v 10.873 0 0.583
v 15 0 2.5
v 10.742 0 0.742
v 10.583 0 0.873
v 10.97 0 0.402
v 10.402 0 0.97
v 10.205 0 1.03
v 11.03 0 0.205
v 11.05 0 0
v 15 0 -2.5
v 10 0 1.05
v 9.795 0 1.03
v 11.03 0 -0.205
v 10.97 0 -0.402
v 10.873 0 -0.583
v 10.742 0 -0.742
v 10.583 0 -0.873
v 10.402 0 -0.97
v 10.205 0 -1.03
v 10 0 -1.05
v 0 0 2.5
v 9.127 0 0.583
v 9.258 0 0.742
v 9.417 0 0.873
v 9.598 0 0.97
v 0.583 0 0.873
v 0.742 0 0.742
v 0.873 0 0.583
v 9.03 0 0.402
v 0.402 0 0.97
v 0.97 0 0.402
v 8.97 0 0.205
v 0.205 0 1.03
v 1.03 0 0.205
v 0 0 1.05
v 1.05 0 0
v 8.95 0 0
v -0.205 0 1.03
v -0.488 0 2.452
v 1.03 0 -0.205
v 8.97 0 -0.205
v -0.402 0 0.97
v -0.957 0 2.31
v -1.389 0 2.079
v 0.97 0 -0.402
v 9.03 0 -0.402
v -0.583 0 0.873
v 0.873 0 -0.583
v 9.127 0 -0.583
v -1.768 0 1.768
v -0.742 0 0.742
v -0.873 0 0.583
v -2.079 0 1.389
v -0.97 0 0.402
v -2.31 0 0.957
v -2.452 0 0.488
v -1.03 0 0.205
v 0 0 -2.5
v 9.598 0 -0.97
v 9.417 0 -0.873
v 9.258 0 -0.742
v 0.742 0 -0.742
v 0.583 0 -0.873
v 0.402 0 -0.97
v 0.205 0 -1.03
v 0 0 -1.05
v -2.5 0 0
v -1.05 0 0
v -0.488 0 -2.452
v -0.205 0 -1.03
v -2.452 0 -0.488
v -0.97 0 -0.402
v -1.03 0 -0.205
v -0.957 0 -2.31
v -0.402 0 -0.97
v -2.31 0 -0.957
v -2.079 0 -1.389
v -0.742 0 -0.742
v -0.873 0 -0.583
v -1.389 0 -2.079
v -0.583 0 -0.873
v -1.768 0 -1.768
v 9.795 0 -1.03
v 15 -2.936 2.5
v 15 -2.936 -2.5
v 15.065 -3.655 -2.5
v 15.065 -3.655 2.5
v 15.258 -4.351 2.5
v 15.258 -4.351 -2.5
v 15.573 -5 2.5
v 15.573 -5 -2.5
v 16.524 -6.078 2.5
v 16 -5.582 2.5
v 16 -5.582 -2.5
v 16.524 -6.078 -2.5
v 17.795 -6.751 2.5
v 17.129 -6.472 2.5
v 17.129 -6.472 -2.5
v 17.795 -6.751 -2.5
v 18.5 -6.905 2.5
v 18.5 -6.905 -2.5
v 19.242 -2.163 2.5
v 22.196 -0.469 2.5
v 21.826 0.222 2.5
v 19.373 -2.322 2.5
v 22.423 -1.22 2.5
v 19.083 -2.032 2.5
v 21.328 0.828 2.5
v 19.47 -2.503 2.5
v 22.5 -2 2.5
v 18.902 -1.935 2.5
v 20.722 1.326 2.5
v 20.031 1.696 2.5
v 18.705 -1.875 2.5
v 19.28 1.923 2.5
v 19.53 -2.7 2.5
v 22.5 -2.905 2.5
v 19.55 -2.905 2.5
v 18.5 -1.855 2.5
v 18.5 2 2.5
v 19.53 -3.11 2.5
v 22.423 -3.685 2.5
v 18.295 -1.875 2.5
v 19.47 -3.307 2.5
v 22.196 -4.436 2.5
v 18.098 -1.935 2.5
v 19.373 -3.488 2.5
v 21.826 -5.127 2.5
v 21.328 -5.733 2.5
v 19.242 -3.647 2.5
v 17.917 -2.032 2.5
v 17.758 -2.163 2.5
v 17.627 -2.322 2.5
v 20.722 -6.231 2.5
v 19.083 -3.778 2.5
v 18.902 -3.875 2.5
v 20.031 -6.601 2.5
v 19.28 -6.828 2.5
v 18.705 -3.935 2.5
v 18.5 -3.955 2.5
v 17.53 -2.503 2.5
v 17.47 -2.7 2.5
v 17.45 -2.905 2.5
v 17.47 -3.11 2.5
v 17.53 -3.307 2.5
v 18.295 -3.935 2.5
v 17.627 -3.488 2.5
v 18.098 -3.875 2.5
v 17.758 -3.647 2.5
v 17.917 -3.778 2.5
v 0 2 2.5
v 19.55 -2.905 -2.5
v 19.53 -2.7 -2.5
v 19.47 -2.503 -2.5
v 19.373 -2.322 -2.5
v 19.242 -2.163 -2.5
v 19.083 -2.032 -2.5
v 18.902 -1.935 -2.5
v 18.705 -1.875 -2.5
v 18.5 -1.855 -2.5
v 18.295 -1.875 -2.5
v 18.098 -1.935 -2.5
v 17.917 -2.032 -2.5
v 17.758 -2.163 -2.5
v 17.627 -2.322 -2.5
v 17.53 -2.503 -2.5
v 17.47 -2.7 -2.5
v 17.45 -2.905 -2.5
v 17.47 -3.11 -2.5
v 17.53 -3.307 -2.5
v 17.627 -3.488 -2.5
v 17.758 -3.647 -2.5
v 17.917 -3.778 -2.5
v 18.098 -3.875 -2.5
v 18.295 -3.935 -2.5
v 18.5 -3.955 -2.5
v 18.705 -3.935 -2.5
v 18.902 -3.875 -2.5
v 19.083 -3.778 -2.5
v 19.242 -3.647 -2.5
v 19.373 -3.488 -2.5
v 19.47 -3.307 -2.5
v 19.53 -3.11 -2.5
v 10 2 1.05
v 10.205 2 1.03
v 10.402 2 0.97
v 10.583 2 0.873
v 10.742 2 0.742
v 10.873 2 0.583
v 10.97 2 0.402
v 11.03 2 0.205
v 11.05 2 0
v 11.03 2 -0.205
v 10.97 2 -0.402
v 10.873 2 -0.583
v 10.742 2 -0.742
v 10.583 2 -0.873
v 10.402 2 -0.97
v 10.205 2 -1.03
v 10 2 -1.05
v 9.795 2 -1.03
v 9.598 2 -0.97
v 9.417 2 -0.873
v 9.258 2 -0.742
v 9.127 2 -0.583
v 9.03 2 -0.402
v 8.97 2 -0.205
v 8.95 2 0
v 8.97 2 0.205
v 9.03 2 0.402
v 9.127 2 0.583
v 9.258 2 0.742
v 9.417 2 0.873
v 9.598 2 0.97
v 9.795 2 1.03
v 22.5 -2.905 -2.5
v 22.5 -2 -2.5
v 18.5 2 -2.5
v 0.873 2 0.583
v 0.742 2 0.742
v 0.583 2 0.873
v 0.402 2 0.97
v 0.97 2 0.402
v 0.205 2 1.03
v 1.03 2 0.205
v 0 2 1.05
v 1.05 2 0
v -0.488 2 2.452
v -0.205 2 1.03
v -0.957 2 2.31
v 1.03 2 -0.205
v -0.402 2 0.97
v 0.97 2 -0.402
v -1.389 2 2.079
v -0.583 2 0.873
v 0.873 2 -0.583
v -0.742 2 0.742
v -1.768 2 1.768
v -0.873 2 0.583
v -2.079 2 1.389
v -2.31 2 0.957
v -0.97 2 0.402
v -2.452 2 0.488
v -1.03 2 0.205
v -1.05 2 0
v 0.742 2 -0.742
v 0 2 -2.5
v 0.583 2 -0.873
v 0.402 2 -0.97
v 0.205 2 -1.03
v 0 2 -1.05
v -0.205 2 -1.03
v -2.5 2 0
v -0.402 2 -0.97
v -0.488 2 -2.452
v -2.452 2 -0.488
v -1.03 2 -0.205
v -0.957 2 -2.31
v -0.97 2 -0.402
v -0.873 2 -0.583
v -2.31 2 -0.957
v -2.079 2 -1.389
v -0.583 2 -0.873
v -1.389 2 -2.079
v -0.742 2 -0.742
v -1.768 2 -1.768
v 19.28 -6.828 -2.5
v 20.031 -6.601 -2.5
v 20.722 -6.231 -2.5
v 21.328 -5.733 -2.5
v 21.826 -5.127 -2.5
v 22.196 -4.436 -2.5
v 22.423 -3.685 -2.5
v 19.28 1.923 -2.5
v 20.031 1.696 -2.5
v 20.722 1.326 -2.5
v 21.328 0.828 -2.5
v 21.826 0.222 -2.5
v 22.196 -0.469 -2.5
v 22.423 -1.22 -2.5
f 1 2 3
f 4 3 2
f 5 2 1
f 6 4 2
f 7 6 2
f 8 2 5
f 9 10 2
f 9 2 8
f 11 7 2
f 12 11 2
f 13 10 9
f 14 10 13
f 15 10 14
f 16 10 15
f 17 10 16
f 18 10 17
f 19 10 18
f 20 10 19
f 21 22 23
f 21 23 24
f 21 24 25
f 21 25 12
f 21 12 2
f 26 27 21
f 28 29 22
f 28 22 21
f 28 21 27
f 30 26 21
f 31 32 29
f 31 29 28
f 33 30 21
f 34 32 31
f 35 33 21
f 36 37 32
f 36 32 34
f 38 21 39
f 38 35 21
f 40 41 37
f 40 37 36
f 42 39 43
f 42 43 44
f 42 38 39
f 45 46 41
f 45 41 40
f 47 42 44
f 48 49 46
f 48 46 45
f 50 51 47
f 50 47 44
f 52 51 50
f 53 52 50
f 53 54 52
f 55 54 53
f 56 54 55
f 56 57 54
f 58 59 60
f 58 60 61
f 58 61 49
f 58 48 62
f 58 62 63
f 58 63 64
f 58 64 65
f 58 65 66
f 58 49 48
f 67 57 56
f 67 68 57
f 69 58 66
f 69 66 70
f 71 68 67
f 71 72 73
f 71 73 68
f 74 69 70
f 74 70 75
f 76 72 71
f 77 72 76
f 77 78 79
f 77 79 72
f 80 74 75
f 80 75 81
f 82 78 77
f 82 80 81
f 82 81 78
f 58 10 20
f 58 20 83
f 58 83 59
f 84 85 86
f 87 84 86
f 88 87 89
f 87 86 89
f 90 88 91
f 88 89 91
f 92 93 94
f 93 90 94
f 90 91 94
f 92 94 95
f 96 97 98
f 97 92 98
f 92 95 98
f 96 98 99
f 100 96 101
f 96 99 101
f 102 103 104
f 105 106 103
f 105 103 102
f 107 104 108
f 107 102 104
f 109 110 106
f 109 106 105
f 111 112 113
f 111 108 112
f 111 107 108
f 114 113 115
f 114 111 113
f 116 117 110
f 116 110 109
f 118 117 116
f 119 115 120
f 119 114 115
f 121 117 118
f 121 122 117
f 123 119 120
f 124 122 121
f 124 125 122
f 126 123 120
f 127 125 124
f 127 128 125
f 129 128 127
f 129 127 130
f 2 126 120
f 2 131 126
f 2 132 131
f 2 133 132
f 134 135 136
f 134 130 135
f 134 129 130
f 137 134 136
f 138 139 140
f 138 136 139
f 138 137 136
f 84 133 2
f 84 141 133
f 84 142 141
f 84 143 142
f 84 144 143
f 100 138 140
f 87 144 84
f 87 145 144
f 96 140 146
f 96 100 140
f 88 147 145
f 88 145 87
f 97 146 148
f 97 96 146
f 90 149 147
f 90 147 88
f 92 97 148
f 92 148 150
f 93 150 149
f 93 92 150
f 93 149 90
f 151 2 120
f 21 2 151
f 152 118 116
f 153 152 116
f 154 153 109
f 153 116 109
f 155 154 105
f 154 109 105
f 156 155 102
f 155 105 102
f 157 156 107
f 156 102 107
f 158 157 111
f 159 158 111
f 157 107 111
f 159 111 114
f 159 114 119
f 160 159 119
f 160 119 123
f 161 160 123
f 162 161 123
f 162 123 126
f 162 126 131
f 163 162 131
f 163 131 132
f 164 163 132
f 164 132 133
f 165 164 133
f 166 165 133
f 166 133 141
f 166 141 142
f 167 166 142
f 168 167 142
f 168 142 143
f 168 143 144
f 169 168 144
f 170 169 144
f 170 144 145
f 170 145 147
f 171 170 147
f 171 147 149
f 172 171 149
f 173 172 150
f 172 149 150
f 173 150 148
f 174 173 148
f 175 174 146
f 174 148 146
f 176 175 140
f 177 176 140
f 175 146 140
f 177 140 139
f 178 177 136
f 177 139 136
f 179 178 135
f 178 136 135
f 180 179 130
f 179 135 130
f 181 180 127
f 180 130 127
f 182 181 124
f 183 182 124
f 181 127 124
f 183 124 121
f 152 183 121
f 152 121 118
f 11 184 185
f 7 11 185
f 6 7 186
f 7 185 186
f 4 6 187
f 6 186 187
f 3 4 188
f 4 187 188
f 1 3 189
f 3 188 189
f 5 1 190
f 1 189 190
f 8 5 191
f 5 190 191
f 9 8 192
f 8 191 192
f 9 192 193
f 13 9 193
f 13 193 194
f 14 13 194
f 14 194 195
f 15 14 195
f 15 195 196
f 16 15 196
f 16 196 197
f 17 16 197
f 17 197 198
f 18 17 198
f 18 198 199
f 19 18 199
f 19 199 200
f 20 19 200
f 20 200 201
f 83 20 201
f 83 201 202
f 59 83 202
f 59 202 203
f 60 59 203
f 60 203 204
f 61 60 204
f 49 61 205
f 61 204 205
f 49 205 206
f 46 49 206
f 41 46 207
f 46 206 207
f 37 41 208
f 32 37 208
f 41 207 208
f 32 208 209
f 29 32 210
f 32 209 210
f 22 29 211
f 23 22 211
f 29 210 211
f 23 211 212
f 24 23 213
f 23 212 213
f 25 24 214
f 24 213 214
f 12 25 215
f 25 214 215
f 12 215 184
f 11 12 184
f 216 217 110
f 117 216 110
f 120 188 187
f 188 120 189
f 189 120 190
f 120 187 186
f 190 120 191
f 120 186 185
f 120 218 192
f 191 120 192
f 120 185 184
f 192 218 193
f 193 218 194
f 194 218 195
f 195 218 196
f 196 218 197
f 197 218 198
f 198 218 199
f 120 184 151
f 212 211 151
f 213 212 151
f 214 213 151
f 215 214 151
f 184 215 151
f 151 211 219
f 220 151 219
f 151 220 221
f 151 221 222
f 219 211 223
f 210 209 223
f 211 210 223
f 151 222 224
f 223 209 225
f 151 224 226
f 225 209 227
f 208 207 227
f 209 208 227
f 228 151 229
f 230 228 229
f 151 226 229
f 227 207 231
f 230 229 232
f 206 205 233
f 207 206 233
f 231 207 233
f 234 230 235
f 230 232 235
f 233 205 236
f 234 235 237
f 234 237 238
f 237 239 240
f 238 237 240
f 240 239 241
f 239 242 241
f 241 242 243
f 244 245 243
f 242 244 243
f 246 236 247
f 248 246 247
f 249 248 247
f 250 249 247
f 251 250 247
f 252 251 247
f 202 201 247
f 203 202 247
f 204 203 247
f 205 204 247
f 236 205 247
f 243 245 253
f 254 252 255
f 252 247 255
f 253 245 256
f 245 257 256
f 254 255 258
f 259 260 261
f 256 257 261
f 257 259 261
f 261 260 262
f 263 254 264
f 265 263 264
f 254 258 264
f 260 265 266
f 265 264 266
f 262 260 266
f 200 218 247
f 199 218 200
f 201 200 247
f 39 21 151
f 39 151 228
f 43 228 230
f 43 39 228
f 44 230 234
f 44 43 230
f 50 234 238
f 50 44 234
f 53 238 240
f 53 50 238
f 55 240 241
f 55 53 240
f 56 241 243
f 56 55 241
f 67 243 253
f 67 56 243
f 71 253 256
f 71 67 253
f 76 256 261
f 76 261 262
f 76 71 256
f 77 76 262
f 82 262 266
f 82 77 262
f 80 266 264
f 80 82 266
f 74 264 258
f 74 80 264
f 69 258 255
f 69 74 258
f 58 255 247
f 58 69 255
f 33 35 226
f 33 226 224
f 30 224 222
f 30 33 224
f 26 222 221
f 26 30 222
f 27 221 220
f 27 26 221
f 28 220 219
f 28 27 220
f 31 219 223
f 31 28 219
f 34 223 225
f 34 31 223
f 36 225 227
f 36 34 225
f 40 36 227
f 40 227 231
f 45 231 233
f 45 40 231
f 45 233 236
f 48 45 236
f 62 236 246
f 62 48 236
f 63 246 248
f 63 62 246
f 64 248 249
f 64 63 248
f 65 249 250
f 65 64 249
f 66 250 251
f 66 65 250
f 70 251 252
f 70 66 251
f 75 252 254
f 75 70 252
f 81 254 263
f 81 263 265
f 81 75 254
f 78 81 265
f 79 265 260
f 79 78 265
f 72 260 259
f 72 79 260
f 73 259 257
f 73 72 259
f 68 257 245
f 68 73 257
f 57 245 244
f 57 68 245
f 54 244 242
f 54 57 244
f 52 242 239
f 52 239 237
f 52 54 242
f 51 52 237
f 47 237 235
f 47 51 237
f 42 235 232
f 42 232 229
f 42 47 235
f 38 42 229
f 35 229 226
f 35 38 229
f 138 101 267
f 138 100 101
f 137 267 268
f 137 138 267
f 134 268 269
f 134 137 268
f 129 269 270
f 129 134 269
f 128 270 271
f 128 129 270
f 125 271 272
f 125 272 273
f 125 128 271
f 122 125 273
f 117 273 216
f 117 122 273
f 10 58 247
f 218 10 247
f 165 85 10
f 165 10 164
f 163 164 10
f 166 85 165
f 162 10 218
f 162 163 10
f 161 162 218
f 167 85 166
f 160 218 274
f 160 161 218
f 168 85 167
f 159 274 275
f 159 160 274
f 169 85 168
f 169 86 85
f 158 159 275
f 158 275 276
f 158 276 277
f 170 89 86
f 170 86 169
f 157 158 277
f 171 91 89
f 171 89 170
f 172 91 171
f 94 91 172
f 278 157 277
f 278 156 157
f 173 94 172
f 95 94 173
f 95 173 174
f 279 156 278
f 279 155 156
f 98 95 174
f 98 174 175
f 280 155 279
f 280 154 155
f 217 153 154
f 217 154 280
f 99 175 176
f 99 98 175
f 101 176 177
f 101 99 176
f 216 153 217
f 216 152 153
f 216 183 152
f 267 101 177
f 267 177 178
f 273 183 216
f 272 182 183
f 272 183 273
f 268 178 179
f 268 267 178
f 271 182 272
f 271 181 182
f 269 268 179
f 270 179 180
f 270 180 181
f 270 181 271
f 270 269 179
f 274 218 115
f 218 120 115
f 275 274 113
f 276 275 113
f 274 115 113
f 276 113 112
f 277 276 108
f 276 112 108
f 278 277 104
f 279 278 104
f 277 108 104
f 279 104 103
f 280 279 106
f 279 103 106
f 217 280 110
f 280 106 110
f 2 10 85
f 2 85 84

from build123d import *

# Parameters (mm, degrees)
SKETCH1_R                = 1.05
BOSS_EXTRUDE1_DEPTH      = 2
SKETCH2_R                = 1.05
CUT_EXTRUDE1_DEPTH       = 23.726636355
BOSS_EXTRUDE2_DEPTH      = 6.905
BOSS_EXTRUDE2_DEPTH_BACK = 2
SKETCH4_W                = 7.5
SKETCH4_H                = 5
FILLET1_R                = 4
SKETCH5_R                = 1.05
CUT_EXTRUDE2_DEPTH       = 14
FILLET2_R                = 4


with BuildPart() as part:
    # Sketch1 → Boss-Extrude1 (new body)
    with BuildSketch(Plane(origin=(0, 0, 0), x_dir=(1, 0, 0), z_dir=(0, 1, 0))):
        with BuildLine():
            Line((0, 2.5), (20, 2.5))
            ThreePointArc((20, 2.5), (22.5, 0), (20, -2.5))
            Line((20, -2.5), (0, -2.5))
            ThreePointArc((0, -2.5), (-2.5, 0), (0, 2.5))
        make_face()
        with Locations(Location((0, 0, 0), (0, 0, 270))):
            Circle(SKETCH1_R, mode=Mode.SUBTRACT)
        with Locations(Location((20, 0, 0), (0, 0, 270))):
            Circle(SKETCH1_R, mode=Mode.SUBTRACT)
    extrude(amount=BOSS_EXTRUDE1_DEPTH)

    # Sketch2 → Cut-Extrude1 (cut, through all)
    with BuildSketch(Plane(origin=(0, 2, 0), x_dir=(1, 0, 0), z_dir=(0, 1, 0))):
        with Locations(Location((10, 0, 0), (0, 0, 270))):
            Circle(SKETCH2_R)
    extrude(amount=-CUT_EXTRUDE1_DEPTH, mode=Mode.SUBTRACT)

    # Sketch4 → Boss-Extrude2 (add, two sides: drawn at the far end of the back side and taken through both)
    with BuildSketch(Plane.XZ.offset(-BOSS_EXTRUDE2_DEPTH_BACK)):
        with Locations((18.75, 0)):
            Rectangle(SKETCH4_W, SKETCH4_H)
    extrude(amount=BOSS_EXTRUDE2_DEPTH + BOSS_EXTRUDE2_DEPTH_BACK)

    # Fillet1
    fillet1_edges = [part.edges().sort_by_distance(p)[0] for p in [
        (22.5, 2, -1.25),
        (22.5, -6.905, 0),
    ]]
    fillet(fillet1_edges, radius=FILLET1_R)

    # Sketch5 → Cut-Extrude2 (cut)
    with BuildSketch(Plane.XY.offset(2.5)):
        with Locations((18.5, -2.905)):
            Circle(SKETCH5_R)
    extrude(amount=-CUT_EXTRUDE2_DEPTH, mode=Mode.SUBTRACT)

    # Fillet2
    # the kernel refuses this fillet: 4 mm, written as the material it takes off along each edge
    with BuildSketch(Plane(origin=(15, -6.905, -12.421567416), x_dir=(0, 1, 0), z_dir=(0, 0, 1))) as fillet2_piece_1:
        with BuildLine():
            CenterArc((3.968626967, -4), FILLET2_R, 90, 82.819244219)
            Line((0, -3.5), (-0.079372539, -3.49))
            ThreePointArc((-0.079372539, -3.49), (-0.08, -1.75), (-0.08, 0))
            Line((-0.08, 0), (0, 0.08))
            Line((0, 0.08), (3.968626967, 0.08))
            Line((3.968626967, 0.08), (3.968626967, 0))
        make_face()
    extrude(amount=24.843134833, mode=Mode.SUBTRACT)


solid = part.part
